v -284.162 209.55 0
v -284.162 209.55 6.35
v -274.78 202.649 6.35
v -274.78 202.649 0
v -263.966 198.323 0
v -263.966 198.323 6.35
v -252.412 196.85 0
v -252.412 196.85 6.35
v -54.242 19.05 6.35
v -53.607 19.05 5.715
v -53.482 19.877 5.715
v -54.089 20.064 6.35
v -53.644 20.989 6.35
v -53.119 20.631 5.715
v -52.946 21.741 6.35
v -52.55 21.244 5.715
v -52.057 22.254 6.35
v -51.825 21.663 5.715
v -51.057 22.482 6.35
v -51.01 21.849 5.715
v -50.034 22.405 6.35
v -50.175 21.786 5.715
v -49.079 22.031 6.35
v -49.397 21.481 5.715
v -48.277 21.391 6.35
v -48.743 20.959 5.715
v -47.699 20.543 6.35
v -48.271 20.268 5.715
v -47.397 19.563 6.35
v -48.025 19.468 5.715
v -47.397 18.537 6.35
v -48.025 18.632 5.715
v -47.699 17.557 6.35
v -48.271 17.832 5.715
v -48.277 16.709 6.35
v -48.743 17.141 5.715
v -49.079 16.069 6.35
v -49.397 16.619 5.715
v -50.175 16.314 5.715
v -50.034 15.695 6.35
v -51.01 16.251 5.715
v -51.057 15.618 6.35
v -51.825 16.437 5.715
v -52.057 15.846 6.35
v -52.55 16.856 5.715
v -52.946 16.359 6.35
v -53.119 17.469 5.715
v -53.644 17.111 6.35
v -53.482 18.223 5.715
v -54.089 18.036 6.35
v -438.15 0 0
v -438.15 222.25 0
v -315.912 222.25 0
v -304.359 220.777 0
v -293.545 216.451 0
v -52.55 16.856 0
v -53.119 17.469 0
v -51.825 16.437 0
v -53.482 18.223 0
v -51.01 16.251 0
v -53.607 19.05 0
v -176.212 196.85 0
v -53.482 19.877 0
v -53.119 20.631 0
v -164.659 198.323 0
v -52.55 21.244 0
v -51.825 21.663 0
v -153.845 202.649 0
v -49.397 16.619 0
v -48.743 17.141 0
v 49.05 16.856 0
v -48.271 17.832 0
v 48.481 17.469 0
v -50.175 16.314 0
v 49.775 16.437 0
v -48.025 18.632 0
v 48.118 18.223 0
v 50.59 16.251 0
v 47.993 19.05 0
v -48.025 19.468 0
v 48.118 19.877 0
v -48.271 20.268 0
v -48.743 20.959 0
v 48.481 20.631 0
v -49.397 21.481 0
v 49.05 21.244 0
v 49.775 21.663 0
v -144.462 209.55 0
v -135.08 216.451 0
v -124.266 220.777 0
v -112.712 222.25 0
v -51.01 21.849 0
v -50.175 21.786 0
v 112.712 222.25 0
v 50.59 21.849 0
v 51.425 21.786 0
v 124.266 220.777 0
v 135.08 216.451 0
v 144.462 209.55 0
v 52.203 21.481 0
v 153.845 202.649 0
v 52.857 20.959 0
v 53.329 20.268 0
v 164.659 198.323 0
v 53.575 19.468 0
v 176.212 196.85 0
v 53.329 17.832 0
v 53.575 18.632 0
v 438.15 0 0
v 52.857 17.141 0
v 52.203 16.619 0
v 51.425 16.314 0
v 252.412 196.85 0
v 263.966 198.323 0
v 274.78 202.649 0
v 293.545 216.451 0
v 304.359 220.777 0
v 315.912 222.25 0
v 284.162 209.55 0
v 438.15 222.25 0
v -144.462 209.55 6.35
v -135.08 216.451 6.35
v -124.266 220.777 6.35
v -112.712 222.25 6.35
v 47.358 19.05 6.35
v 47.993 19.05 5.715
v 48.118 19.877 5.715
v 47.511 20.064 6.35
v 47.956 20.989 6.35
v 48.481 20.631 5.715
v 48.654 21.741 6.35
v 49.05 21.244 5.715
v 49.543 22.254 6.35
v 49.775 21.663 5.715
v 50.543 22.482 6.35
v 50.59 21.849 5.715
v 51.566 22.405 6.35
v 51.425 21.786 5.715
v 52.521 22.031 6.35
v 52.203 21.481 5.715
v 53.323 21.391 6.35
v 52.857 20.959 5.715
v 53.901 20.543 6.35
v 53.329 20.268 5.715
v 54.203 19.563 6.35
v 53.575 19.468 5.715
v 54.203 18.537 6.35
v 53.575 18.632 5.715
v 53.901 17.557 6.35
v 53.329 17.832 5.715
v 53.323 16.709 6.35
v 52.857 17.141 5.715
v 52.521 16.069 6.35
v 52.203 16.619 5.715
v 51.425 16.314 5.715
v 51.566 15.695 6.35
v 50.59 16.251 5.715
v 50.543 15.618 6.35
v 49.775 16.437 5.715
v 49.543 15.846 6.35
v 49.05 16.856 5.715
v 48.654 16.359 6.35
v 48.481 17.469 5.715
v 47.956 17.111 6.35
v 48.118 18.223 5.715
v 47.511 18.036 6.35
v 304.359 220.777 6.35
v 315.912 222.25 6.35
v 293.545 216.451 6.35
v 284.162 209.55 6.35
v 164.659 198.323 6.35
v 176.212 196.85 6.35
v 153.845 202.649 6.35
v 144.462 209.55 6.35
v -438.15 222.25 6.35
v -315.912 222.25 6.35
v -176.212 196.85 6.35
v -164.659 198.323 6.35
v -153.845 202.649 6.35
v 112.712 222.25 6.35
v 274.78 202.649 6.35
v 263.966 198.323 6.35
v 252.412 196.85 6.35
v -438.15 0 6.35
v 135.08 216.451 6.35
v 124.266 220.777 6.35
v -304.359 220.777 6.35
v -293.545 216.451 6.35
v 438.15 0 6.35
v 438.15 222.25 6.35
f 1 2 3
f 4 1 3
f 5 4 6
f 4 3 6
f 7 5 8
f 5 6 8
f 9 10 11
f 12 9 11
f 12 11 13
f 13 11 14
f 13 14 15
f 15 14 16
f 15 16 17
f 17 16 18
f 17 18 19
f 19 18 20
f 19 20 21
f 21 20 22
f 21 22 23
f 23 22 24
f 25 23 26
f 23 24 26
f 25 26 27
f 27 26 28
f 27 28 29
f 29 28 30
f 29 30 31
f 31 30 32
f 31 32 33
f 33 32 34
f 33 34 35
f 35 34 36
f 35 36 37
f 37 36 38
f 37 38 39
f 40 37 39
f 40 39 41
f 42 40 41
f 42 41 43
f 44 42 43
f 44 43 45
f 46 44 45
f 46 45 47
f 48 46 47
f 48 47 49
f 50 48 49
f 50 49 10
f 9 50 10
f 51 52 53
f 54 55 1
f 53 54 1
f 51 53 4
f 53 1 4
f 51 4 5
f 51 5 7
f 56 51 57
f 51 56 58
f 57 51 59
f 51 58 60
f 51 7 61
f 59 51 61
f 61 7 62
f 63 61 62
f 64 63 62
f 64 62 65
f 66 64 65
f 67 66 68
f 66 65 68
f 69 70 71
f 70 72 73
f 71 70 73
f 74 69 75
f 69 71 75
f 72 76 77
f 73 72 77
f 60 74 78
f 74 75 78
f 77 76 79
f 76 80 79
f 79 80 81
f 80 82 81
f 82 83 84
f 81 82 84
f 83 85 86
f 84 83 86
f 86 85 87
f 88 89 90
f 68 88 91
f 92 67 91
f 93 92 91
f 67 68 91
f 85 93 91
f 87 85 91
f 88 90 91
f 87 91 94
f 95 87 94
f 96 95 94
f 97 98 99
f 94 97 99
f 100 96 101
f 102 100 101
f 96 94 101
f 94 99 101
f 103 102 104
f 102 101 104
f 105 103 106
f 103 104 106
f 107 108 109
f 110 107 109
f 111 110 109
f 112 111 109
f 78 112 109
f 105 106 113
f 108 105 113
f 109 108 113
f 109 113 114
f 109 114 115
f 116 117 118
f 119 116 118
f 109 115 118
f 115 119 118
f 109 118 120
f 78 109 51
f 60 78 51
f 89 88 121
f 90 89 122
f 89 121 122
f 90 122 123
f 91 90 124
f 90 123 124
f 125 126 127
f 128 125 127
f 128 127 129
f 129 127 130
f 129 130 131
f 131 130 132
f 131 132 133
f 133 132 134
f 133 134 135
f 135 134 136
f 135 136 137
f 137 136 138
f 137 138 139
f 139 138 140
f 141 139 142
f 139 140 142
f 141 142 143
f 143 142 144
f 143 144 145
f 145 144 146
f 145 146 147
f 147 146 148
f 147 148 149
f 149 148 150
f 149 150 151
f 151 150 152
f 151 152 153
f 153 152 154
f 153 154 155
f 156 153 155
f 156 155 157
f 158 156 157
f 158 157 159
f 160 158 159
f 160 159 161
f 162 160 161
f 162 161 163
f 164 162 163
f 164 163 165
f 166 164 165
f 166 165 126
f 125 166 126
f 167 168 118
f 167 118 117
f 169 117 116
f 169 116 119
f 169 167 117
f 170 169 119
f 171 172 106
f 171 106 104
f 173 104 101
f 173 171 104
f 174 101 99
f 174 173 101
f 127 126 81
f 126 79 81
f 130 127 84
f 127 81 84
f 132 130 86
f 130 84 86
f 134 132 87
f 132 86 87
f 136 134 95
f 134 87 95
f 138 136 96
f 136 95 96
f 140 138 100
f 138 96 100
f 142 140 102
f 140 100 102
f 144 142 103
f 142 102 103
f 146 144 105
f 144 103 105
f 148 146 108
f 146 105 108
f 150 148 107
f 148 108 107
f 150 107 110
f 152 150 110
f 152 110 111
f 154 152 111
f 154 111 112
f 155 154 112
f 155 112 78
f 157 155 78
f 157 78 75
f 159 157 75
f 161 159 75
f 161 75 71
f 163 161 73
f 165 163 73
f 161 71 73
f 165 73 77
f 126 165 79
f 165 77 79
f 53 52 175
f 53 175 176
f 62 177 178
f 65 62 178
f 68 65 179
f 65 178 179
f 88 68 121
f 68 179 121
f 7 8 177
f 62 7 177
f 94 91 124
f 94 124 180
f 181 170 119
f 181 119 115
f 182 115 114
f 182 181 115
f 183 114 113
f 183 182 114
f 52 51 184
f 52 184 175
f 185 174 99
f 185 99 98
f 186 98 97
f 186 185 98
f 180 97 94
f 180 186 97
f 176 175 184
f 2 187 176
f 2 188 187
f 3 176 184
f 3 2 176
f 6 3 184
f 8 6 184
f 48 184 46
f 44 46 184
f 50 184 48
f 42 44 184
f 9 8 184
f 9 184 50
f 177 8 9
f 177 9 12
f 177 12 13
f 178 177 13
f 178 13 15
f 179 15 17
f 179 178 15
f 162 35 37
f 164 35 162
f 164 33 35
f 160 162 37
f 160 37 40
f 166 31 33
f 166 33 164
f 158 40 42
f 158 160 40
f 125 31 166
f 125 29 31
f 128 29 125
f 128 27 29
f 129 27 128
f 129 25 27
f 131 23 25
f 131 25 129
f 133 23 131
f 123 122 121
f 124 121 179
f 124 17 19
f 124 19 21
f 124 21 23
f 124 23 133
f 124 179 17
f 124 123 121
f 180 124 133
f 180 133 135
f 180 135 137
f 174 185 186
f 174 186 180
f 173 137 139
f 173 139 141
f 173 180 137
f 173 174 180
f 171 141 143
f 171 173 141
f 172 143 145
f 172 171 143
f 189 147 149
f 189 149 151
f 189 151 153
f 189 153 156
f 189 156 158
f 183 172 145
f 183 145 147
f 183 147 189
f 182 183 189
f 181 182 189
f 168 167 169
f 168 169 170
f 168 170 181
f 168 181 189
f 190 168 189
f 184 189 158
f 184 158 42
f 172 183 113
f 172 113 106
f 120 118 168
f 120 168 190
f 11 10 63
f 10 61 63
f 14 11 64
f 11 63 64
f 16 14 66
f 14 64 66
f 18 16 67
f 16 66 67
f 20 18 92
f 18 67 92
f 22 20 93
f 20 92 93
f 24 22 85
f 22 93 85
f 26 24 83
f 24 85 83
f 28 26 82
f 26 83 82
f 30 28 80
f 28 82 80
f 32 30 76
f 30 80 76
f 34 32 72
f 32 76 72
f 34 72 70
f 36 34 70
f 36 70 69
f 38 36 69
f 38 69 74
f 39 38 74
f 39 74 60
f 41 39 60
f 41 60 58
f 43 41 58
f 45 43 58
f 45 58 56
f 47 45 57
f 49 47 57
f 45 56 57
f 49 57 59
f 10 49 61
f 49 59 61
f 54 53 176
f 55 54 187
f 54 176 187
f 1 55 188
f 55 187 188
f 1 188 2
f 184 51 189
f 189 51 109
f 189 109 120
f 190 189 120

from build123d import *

# Parameters (mm, degrees)
SKETCH1_W                        = 876.3
SKETCH1_H                        = 222.25
BOSS_EXTRUDE1_DEPTH              = 6.35
F_10_CLEARANCE_HOLE1_D           = 5.6134
F_10_CLEARANCE_HOLE1_CSINK_D     = 6.8834
F_10_CLEARANCE_HOLE1_CSINK_ANGLE = 90
CUT_EXTRUDE1_DEPTH               = 492.335738065


with BuildPart() as part:
    # Sketch1 → Boss-Extrude1 (new body)
    with BuildSketch(Plane.XY):
        with Locations((0, 111.125)):
            Rectangle(SKETCH1_W, SKETCH1_H)
    extrude(amount=BOSS_EXTRUDE1_DEPTH)

    # #10 Clearance Hole1 (through all)
    with Locations(Plane.XY.offset(6.35)):
        with Locations((-50.8, 19.05), (50.8, 19.05)):
            CounterSinkHole(F_10_CLEARANCE_HOLE1_D / 2, F_10_CLEARANCE_HOLE1_CSINK_D / 2, counter_sink_angle=F_10_CLEARANCE_HOLE1_CSINK_ANGLE)

    # Sketch5 → Cut-Extrude1 (cut, through all)
    with BuildSketch(Plane.XY.offset(6.35)):
        with BuildLine():
            Line((112.7125, 234.95), (315.9125, 234.95))
            Line((315.9125, 234.95), (315.9125, 222.25))
            ThreePointArc((315.9125, 222.25), (298.814601737, 218.957245657), (284.1625, 209.55))
            ThreePointArc((284.1625, 209.55), (269.510398263, 200.142754343), (252.4125, 196.85))
            Line((252.4125, 196.85), (176.2125, 196.85))
            ThreePointArc((176.2125, 196.85), (159.114601737, 200.142754343), (144.4625, 209.55))
            ThreePointArc((144.4625, 209.55), (129.810398263, 218.957245657), (112.7125, 222.25))
            Line((112.7125, 222.25), (112.7125, 234.95))
        make_face()
    cut_extrude1 = extrude(amount=-CUT_EXTRUDE1_DEPTH, mode=Mode.SUBTRACT)

    # Mirror1: Cut-Extrude1 across plane
    add(cut_extrude1.mirror(Plane(origin=(0, 0, 0), x_dir=(0, 0, 1), z_dir=(1, 0, 0))), mode=Mode.SUBTRACT)


solid = part.part
